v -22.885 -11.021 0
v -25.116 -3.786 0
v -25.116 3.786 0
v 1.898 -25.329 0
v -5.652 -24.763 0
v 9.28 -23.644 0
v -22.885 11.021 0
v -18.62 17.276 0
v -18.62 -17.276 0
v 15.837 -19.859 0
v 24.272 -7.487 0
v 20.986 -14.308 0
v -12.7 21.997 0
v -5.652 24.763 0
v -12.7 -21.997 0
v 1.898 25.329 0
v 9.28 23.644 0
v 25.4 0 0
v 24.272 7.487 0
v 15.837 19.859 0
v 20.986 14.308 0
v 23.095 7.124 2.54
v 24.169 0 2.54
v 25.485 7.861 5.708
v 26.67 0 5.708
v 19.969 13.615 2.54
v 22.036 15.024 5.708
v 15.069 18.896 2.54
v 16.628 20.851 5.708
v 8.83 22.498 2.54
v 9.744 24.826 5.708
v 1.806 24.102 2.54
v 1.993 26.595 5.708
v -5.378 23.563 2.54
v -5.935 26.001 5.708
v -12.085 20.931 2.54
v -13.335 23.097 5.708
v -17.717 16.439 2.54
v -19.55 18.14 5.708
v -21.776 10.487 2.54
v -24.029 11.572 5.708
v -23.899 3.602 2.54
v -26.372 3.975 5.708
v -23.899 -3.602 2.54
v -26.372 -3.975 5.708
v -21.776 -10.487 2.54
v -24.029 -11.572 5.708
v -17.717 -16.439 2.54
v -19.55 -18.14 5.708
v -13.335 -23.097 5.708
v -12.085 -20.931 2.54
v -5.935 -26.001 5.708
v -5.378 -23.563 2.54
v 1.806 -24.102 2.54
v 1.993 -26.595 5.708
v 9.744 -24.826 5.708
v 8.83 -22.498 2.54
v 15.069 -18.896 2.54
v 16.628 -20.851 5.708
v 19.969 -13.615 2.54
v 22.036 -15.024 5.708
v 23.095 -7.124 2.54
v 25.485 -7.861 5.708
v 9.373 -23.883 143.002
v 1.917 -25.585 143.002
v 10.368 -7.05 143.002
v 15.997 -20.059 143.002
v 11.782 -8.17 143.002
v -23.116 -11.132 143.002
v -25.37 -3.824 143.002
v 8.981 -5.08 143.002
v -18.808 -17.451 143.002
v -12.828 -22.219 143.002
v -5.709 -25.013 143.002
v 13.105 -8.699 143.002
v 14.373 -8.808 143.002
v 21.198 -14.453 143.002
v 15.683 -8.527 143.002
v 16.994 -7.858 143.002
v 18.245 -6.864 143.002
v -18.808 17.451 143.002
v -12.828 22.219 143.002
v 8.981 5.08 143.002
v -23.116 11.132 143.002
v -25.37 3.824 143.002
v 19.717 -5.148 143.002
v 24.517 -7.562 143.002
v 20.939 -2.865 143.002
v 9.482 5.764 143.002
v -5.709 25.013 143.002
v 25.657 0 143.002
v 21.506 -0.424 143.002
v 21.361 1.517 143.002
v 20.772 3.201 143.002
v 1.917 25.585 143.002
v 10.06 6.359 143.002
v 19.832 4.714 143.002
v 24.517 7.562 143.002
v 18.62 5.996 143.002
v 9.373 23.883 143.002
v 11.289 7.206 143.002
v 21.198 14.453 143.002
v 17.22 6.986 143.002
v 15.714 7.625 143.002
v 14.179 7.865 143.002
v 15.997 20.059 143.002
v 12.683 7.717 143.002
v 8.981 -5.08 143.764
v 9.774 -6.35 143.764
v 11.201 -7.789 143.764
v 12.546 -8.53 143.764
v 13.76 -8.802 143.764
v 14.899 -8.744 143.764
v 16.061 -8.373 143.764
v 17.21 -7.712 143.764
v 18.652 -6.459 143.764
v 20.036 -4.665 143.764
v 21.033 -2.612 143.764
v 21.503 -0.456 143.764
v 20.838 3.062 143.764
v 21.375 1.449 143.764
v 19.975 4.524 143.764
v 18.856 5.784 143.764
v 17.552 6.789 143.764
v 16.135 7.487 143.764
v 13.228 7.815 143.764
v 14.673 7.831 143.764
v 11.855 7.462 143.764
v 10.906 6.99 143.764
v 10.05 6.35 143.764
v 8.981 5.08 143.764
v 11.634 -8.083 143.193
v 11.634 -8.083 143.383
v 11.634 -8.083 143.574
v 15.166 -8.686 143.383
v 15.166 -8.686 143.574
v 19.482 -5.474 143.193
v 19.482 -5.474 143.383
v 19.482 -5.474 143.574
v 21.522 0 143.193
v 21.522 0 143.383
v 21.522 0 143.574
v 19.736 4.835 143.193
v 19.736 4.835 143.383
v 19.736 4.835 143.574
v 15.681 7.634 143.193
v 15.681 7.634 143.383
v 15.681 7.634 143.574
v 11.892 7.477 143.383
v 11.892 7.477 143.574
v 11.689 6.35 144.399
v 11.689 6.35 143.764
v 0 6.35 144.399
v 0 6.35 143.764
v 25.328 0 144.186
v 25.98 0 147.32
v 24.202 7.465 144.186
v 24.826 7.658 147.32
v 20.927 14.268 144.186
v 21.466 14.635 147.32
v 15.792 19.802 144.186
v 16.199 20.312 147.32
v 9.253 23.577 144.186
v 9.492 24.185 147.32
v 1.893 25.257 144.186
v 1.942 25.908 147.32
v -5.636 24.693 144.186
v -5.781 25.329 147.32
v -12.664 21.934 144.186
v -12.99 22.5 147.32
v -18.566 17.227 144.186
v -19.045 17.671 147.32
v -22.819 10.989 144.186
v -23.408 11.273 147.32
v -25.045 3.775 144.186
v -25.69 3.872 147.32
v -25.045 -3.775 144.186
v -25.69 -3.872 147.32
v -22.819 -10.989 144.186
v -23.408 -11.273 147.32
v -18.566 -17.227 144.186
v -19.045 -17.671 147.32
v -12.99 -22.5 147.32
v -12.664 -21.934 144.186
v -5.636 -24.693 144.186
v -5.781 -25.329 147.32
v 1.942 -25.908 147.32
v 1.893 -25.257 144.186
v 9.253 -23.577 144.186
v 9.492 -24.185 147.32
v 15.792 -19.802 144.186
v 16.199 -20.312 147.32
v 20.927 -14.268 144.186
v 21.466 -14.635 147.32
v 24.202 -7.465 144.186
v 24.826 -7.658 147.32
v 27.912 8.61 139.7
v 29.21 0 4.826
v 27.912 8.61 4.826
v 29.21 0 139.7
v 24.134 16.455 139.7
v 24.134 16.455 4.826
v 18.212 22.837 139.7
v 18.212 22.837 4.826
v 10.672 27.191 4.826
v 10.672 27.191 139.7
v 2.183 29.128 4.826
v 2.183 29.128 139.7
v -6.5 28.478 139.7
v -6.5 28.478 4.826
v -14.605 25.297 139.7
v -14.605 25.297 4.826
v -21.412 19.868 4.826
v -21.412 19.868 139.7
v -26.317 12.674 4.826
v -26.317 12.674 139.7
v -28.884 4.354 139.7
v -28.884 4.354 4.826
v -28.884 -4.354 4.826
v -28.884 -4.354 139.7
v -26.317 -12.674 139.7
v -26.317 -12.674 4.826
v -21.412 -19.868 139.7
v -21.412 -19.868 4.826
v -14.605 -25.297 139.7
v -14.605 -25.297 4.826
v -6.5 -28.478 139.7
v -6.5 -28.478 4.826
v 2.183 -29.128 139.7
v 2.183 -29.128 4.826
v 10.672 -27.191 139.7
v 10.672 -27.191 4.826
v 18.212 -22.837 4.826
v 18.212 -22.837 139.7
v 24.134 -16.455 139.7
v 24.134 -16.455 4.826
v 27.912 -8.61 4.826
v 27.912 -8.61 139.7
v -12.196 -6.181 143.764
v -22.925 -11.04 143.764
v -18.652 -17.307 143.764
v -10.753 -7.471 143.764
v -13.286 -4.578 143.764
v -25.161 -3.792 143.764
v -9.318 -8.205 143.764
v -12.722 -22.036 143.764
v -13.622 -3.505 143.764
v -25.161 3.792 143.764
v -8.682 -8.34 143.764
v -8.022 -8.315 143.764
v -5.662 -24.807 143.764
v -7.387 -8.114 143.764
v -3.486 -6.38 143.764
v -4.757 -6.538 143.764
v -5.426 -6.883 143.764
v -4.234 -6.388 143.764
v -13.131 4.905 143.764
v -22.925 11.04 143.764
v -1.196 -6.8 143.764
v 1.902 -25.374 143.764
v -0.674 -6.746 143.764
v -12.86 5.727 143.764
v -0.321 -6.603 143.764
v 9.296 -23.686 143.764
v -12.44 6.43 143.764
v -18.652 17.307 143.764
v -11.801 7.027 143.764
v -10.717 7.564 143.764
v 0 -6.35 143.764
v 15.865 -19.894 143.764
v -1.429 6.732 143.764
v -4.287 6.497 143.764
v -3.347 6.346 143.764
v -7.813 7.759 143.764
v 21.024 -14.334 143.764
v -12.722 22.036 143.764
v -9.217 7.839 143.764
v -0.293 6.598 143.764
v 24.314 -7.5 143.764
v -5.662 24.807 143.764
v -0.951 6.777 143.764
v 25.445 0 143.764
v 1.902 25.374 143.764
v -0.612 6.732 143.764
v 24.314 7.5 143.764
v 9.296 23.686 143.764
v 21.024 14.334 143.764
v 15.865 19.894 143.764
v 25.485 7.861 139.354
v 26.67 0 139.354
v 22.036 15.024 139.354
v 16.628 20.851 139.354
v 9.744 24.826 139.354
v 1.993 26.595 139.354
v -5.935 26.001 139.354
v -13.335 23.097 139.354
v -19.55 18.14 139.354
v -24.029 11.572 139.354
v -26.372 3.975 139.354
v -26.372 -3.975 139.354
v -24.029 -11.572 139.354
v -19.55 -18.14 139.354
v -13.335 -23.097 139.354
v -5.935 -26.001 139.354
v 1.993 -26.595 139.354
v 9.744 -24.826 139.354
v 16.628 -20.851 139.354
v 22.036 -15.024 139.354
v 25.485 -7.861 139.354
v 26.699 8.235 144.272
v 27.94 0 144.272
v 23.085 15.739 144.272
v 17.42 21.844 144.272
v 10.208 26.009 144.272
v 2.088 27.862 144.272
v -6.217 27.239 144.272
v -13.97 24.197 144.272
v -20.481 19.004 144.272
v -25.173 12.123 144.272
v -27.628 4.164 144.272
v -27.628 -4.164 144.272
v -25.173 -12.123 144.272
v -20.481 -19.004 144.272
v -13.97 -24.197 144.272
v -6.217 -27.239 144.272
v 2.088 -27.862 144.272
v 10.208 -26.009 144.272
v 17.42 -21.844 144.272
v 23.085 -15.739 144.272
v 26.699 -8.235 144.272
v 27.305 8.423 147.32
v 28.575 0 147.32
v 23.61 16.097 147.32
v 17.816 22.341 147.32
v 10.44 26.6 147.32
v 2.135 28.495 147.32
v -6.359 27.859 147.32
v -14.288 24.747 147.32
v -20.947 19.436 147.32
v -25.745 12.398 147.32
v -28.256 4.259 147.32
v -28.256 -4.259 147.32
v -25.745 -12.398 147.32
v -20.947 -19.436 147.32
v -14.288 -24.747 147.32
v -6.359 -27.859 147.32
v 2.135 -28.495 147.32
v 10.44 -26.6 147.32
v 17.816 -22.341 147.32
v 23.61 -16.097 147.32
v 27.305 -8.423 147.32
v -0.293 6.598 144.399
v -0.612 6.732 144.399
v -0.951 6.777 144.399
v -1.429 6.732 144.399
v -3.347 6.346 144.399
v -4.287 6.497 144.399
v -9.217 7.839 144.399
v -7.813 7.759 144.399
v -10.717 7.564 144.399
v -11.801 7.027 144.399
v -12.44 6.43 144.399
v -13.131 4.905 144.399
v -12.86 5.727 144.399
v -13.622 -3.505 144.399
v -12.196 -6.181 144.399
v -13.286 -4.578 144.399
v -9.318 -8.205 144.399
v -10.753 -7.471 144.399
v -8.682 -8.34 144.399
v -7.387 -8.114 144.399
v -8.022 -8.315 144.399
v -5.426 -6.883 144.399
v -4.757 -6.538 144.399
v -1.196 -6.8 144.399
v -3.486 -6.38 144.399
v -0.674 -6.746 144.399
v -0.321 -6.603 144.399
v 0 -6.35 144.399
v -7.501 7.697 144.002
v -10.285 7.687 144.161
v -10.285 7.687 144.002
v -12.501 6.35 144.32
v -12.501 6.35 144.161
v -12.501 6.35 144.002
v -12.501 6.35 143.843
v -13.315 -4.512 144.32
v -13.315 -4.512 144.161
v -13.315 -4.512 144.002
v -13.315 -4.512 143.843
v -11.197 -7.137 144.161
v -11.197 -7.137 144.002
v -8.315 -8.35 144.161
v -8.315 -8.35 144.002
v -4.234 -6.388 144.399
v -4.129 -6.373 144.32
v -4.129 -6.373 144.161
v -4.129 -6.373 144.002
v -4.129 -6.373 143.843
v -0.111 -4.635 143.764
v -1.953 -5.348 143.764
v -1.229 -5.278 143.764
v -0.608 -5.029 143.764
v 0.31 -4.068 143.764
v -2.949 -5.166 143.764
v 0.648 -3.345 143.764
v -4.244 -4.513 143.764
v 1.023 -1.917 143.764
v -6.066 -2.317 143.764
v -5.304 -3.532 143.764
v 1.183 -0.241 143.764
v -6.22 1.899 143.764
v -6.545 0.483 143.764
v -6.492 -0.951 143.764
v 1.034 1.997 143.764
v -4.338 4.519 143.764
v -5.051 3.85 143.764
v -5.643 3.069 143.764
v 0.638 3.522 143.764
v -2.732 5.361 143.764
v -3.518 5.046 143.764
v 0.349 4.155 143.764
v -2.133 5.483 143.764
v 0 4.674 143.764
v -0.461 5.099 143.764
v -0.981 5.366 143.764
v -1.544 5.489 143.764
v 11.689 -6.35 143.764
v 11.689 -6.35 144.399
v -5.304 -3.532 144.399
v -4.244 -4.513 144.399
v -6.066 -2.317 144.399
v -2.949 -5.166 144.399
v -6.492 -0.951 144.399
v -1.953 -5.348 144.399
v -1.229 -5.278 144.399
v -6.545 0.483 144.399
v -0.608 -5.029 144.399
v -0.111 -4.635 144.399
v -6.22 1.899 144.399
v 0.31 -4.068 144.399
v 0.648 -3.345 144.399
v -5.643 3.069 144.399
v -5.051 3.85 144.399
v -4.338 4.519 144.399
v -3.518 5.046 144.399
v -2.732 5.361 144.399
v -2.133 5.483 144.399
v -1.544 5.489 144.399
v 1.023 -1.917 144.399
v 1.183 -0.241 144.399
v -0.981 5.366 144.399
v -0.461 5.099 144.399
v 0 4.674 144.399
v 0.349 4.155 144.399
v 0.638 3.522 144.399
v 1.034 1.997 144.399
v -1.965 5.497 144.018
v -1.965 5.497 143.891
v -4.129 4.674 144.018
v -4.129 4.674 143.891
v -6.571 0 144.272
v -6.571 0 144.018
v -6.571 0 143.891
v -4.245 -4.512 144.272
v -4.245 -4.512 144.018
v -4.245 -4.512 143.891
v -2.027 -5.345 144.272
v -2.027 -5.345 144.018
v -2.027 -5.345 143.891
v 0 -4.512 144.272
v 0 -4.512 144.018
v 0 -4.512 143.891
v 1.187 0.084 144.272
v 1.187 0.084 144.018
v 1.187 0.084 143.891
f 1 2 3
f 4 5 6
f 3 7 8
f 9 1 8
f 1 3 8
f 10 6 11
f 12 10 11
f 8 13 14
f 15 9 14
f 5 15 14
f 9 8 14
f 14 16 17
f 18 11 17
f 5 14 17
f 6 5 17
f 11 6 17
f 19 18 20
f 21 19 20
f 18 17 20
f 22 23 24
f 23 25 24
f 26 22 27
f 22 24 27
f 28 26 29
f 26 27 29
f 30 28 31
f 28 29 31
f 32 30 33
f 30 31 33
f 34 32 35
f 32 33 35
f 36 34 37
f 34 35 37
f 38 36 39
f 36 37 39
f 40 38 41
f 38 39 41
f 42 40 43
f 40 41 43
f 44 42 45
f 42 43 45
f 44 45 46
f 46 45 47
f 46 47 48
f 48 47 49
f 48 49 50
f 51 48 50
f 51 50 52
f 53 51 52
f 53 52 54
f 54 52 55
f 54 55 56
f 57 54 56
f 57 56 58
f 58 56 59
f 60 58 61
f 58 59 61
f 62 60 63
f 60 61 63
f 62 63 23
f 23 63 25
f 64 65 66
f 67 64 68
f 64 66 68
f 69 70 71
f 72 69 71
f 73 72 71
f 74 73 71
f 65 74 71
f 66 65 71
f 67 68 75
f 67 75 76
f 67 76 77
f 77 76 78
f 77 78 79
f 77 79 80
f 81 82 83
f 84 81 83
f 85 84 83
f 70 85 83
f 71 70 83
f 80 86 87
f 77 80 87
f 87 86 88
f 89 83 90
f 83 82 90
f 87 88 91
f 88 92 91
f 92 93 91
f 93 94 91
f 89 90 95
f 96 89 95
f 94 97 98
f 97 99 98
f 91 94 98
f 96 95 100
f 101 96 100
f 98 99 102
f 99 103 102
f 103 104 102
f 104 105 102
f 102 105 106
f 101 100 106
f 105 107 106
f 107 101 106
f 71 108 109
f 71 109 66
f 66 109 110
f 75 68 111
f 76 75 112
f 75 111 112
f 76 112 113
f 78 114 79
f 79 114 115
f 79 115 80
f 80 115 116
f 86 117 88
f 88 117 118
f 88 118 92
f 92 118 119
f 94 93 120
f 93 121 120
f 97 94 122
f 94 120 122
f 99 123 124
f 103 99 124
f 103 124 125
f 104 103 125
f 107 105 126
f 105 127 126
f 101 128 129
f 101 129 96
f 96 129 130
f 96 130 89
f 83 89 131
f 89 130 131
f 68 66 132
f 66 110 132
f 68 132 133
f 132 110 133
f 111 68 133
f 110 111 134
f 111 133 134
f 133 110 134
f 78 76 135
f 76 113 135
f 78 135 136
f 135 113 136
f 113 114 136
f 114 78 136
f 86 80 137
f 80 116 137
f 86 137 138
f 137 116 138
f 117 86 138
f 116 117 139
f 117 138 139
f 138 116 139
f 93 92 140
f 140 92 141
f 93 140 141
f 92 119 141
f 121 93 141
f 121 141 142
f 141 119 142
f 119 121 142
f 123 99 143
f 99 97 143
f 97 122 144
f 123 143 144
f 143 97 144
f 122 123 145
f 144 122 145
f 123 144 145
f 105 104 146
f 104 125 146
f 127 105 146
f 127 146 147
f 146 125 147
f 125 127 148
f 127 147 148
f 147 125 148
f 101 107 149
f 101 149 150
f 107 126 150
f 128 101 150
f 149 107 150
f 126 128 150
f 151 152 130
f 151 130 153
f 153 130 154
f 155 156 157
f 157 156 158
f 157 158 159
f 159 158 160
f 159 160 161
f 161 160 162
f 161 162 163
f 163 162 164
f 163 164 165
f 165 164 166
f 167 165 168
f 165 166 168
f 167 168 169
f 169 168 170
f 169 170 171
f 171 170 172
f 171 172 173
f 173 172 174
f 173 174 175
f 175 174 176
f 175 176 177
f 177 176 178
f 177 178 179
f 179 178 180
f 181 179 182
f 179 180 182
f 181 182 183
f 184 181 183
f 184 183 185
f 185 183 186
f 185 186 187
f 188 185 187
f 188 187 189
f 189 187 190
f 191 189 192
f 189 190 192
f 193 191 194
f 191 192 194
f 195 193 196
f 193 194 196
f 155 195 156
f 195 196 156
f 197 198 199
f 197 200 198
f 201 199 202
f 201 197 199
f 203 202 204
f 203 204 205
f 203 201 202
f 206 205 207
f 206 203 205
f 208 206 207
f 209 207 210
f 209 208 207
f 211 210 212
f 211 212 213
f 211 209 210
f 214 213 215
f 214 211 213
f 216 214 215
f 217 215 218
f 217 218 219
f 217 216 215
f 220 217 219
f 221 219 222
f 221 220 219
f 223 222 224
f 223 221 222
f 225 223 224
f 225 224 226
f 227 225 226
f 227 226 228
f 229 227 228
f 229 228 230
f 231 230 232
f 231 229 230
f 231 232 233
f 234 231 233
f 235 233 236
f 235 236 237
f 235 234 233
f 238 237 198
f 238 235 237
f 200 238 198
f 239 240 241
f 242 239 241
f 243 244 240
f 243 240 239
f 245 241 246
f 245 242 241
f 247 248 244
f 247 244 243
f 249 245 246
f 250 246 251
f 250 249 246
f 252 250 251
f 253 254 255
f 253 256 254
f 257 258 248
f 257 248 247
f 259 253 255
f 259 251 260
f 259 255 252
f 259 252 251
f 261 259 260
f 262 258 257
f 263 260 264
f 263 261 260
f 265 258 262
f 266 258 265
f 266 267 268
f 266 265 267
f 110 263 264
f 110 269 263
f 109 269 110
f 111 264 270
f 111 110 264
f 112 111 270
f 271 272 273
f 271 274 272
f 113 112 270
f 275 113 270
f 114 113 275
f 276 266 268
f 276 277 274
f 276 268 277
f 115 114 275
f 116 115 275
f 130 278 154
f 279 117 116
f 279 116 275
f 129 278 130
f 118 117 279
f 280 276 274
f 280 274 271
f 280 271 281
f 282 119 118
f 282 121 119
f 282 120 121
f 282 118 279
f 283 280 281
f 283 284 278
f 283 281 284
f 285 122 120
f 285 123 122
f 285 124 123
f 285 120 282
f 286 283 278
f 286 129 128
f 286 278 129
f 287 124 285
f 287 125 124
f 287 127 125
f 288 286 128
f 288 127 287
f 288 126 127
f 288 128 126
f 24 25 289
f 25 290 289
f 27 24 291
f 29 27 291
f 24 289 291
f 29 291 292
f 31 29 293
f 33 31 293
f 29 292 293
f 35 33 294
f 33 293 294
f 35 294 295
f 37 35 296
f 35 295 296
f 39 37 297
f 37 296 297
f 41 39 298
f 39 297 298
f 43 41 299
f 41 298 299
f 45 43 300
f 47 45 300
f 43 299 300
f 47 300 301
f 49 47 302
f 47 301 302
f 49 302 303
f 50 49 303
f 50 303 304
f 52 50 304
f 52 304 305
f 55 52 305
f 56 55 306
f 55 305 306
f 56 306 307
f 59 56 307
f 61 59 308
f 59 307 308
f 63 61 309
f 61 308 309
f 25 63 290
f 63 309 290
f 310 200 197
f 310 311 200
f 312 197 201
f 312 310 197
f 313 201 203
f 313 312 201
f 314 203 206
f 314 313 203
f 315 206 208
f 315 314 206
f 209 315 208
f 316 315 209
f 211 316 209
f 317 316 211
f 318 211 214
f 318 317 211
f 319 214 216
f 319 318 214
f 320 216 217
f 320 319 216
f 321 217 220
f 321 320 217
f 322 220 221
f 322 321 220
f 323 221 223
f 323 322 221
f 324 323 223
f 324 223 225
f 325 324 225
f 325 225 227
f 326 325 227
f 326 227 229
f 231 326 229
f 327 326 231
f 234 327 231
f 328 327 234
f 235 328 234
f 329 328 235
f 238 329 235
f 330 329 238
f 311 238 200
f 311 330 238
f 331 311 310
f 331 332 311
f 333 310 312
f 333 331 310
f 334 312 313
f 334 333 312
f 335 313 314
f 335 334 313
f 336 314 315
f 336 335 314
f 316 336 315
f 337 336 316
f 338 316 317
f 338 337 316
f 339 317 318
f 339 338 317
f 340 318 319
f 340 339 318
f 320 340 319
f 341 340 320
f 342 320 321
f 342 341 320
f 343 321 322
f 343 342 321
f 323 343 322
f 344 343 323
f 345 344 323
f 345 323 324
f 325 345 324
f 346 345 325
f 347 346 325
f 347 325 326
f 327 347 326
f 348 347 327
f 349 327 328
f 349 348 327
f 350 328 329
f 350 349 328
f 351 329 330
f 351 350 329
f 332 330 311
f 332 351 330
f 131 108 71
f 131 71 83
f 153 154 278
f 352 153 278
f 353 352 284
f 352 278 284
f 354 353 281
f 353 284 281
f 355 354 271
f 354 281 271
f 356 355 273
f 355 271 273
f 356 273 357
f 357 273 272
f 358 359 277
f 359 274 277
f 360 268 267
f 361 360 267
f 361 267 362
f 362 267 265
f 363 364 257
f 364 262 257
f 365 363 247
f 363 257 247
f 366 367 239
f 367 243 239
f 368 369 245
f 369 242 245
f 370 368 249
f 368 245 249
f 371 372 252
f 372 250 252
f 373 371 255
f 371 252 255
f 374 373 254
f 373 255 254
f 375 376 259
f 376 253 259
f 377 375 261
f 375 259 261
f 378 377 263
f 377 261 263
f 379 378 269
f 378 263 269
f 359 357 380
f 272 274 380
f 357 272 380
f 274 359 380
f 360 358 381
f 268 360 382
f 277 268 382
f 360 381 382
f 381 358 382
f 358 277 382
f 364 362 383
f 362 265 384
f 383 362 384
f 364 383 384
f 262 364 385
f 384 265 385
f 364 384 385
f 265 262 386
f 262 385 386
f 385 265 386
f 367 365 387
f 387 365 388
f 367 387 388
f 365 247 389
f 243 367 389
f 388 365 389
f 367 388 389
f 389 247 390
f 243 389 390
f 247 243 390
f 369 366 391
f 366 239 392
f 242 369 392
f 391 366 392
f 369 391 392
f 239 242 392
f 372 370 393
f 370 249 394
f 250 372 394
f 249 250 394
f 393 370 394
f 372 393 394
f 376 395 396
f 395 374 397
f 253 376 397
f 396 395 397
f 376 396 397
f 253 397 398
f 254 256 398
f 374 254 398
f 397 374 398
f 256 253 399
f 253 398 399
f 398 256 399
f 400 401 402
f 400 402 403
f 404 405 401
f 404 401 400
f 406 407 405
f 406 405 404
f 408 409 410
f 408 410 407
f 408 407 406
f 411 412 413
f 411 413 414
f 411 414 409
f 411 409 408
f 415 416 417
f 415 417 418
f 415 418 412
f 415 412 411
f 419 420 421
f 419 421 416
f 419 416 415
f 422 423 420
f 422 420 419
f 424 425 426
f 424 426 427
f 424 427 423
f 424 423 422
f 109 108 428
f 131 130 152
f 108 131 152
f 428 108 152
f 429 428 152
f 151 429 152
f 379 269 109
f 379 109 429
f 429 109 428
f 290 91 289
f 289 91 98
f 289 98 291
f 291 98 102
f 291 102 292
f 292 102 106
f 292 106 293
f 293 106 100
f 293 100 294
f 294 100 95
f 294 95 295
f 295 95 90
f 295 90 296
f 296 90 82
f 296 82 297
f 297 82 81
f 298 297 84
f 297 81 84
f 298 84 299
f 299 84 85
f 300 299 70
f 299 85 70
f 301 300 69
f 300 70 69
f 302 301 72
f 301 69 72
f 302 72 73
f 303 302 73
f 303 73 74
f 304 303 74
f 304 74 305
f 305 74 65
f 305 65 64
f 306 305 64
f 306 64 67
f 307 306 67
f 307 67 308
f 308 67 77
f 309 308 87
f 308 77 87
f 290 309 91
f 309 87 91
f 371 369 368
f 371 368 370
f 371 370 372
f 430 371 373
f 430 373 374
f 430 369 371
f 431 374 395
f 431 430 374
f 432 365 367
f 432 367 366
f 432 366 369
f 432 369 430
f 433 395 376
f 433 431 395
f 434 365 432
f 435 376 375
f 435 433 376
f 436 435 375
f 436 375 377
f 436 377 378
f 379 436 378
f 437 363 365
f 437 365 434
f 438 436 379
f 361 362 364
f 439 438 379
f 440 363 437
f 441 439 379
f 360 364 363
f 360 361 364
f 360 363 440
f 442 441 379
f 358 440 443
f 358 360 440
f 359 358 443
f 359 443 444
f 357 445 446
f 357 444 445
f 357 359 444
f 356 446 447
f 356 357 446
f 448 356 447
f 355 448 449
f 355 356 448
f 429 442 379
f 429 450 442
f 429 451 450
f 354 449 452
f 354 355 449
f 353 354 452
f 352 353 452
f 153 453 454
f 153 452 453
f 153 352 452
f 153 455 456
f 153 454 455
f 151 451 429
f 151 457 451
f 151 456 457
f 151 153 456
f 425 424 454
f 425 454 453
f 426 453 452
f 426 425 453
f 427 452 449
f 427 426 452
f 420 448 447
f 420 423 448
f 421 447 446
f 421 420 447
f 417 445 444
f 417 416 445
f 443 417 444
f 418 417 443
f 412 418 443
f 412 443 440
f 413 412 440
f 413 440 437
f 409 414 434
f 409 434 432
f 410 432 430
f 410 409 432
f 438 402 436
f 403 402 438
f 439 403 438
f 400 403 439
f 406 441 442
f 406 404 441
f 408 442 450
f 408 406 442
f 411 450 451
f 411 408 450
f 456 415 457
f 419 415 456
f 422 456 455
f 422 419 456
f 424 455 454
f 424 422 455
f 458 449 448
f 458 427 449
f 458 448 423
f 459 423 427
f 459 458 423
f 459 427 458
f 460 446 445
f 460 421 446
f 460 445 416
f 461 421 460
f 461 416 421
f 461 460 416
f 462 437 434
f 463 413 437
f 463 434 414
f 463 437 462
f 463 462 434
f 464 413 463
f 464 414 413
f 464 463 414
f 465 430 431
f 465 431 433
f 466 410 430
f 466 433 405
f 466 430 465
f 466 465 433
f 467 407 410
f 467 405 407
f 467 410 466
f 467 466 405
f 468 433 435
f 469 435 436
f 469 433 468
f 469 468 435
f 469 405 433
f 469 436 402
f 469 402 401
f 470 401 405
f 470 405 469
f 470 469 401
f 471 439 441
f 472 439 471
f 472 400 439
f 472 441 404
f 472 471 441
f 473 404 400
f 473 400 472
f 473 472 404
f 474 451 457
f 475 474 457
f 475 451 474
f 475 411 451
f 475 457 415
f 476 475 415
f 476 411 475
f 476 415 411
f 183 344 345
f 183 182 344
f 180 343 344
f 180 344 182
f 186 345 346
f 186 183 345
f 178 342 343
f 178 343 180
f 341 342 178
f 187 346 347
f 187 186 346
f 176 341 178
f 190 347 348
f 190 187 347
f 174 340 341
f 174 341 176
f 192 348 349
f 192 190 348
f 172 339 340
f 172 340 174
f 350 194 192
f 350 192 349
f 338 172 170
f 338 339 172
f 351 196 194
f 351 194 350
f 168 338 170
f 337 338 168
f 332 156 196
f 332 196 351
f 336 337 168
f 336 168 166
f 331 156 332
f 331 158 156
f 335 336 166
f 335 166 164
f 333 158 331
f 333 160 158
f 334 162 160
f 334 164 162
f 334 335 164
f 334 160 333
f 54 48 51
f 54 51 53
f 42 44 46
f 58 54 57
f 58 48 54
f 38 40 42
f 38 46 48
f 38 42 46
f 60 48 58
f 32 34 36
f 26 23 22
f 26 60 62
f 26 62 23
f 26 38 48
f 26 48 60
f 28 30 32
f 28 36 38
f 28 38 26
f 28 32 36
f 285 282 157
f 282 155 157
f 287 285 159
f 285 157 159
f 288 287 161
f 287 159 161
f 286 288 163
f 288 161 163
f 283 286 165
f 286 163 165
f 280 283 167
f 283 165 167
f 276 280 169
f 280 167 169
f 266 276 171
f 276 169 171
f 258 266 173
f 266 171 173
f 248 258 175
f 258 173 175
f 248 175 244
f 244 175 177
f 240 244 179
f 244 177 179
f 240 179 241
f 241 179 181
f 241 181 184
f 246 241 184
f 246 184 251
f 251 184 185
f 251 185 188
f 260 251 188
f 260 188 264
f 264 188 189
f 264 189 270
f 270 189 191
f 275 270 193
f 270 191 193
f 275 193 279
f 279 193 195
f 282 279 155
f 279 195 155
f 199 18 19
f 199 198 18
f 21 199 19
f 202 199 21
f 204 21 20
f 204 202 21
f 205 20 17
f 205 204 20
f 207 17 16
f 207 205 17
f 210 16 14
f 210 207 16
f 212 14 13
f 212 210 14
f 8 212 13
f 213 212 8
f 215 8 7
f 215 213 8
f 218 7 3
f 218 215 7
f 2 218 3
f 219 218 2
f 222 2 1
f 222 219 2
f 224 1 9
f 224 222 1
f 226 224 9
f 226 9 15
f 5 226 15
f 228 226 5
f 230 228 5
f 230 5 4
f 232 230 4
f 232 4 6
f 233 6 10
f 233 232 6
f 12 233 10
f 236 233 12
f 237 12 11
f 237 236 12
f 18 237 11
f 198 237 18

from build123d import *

# Parameters (mm, degrees)
F2_R      = 29.21
F4_R      = 29.21
F0_R      = 25.4
F8_R      = 27.94
F11_R     = 28.575
F13_T     = -2.54
F15_R     = 27.94
F16_DEPTH = 0.762
F18_DEPTH = 0.635


with BuildPart() as f5:
    # F2 (on offset) → F5 section 0
    with BuildSketch(Plane.XY.offset(4.826)):
        Circle(F2_R)
    # F4 (on offset) → F5 section 1
    with BuildSketch(Plane.XY.offset(139.7)):
        Circle(F4_R)
    loft()

    # F0 (on Top) → F6 section 0
    with BuildSketch(Plane.XY):
        Circle(F0_R)
    # F2 (on offset) → F6 section 1
    with BuildSketch(Plane.XY.offset(4.826)):
        Circle(F2_R)
    loft()

    # F4 (on offset) → F9 section 0
    with BuildSketch(Plane.XY.offset(139.7)):
        Circle(F4_R)
    # F8 (on offset) → F9 section 1
    with BuildSketch(Plane.XY.offset(144.272)):
        Circle(F8_R)
    loft()

    # F8 (on offset) → F12 section 0
    with BuildSketch(Plane.XY.offset(144.272)):
        Circle(F8_R)
    # F11 (on offset) → F12 section 1
    with BuildSketch(Plane.XY.offset(147.32)):
        Circle(F11_R)
    loft()

    # F13
    f13_openings = [f5.faces().sort_by_distance(p)[0] for p in [
        (0, 0, 147.32),
    ]]
    offset(amount=F13_T, openings=f13_openings, kind=Kind.INTERSECTION)

    # F15 (on offset) → F16 (join)
    with BuildSketch(Plane.XY.offset(143.764)):
        Circle(F15_R)
        with BuildLine():
            add(Edge.make_bspline(
                [(8.9813927189, -5.08), (10.307283956, -7.660759653), (15.5638091176, -11.3190362963), (24.5819782778, 0.156554303), (16.2046906326, 9.5661078257), (10.4008527308, 7.3320350733), (8.9813927189, 5.08)],
                knots=[0, 0, 0, 0, 0.1793099128, 0.3991725973, 0.6069429862, 0.7863905321, 0.7863905321, 0.7863905321, 0.7863905321], degree=3))
            add(Edge.make_bspline(
                [(8.9813927189, 5.08), (7.2917062072, 2.3992388266), (7.4018764658, -2.0055760179), (8.9813927189, -5.08)],
                knots=[0.7863905321, 0.7863905321, 0.7863905321, 0.7863905321, 1, 1, 1, 1], degree=3))
        make_face(mode=Mode.SUBTRACT)
        with BuildLine():
            add(Edge.make_bspline(
                [(8.9813927189, 5.08), (7.2917062072, 2.3992388266), (7.4018764658, -2.0055760179), (8.9813927189, -5.08)],
                knots=[0.7863905321, 0.7863905321, 0.7863905321, 0.7863905321, 1, 1, 1, 1], degree=3))
            Line((8.9813927189, -5.08), (8.9813927189, 0))
            Line((8.9813927189, 0), (8.9813927189, 5.08))
        make_face()
    extrude(amount=-F16_DEPTH)

    # F17 (on offset) → F18 (join)
    with BuildSketch(Plane.XY.offset(143.764)):
        with BuildLine():
            Line((11.6892714785, -6.35), (11.6892714785, 0))
            Line((11.6892714785, 0), (11.6892714785, 6.35))
            Line((11.6892714785, 6.35), (0, 6.35))
            add(Edge.make_bspline(
                [(0, -6.35), (1.8282559625, -4.4581892492), (1.6638111749, 4.50159086), (0, 6.35)],
                knots=[0.8311304713, 0.8311304713, 0.8311304713, 0.8311304713, 1, 1, 1, 1], degree=3))
            Line((0, -6.35), (11.6892714785, -6.35))
        make_face()
        with BuildLine():
            add(Edge.make_bspline(
                [(0, -6.35), (1.8282559625, -4.4581892492), (1.6638111749, 4.50159086), (0, 6.35)],
                knots=[0.8311304713, 0.8311304713, 0.8311304713, 0.8311304713, 1, 1, 1, 1], degree=3))
            add(Edge.make_bspline(
                [(0, 6.35), (-0.8350152674, 7.2776592654), (-3.4873611567, 5.389008621), (-7.2168226702, 8.4501082119), (-13.9400747086, 7.2984183342), (-13.0107401815, -0.2357314092), (-14.5251656567, -4.4878007238), (-8.0963607859, -10.2798866877), (-4.5226600604, -4.9183886243), (-1.0424695397, -7.4287084101), (0, -6.35)],
                knots=[0, 0, 0, 0, 0.0847503832, 0.1853664744, 0.2931999501, 0.4132443298, 0.5139191398, 0.6328846388, 0.7348412518, 0.8311304713, 0.8311304713, 0.8311304713, 0.8311304713], degree=3))
        make_face()
        with BuildLine():
            add(Edge.make_bspline(
                [(0, 4.6740733087), (-1.0550088408, 5.935167024), (-4.791474758, 5.2358502182), (-7.4773661307, 0.0019184091), (-4.9055168376, -5.0690387184), (1.6043119196, -6.306676079), (1.5736327616, 2.7930479473), (0, 4.6740733087)],
                knots=[0, 0, 0, 0, 0.1740799793, 0.3708117314, 0.5638311353, 0.7403453431, 1, 1, 1, 1], degree=3))
        make_face(mode=Mode.SUBTRACT)
    extrude(amount=F18_DEPTH)


solid = f5.part
